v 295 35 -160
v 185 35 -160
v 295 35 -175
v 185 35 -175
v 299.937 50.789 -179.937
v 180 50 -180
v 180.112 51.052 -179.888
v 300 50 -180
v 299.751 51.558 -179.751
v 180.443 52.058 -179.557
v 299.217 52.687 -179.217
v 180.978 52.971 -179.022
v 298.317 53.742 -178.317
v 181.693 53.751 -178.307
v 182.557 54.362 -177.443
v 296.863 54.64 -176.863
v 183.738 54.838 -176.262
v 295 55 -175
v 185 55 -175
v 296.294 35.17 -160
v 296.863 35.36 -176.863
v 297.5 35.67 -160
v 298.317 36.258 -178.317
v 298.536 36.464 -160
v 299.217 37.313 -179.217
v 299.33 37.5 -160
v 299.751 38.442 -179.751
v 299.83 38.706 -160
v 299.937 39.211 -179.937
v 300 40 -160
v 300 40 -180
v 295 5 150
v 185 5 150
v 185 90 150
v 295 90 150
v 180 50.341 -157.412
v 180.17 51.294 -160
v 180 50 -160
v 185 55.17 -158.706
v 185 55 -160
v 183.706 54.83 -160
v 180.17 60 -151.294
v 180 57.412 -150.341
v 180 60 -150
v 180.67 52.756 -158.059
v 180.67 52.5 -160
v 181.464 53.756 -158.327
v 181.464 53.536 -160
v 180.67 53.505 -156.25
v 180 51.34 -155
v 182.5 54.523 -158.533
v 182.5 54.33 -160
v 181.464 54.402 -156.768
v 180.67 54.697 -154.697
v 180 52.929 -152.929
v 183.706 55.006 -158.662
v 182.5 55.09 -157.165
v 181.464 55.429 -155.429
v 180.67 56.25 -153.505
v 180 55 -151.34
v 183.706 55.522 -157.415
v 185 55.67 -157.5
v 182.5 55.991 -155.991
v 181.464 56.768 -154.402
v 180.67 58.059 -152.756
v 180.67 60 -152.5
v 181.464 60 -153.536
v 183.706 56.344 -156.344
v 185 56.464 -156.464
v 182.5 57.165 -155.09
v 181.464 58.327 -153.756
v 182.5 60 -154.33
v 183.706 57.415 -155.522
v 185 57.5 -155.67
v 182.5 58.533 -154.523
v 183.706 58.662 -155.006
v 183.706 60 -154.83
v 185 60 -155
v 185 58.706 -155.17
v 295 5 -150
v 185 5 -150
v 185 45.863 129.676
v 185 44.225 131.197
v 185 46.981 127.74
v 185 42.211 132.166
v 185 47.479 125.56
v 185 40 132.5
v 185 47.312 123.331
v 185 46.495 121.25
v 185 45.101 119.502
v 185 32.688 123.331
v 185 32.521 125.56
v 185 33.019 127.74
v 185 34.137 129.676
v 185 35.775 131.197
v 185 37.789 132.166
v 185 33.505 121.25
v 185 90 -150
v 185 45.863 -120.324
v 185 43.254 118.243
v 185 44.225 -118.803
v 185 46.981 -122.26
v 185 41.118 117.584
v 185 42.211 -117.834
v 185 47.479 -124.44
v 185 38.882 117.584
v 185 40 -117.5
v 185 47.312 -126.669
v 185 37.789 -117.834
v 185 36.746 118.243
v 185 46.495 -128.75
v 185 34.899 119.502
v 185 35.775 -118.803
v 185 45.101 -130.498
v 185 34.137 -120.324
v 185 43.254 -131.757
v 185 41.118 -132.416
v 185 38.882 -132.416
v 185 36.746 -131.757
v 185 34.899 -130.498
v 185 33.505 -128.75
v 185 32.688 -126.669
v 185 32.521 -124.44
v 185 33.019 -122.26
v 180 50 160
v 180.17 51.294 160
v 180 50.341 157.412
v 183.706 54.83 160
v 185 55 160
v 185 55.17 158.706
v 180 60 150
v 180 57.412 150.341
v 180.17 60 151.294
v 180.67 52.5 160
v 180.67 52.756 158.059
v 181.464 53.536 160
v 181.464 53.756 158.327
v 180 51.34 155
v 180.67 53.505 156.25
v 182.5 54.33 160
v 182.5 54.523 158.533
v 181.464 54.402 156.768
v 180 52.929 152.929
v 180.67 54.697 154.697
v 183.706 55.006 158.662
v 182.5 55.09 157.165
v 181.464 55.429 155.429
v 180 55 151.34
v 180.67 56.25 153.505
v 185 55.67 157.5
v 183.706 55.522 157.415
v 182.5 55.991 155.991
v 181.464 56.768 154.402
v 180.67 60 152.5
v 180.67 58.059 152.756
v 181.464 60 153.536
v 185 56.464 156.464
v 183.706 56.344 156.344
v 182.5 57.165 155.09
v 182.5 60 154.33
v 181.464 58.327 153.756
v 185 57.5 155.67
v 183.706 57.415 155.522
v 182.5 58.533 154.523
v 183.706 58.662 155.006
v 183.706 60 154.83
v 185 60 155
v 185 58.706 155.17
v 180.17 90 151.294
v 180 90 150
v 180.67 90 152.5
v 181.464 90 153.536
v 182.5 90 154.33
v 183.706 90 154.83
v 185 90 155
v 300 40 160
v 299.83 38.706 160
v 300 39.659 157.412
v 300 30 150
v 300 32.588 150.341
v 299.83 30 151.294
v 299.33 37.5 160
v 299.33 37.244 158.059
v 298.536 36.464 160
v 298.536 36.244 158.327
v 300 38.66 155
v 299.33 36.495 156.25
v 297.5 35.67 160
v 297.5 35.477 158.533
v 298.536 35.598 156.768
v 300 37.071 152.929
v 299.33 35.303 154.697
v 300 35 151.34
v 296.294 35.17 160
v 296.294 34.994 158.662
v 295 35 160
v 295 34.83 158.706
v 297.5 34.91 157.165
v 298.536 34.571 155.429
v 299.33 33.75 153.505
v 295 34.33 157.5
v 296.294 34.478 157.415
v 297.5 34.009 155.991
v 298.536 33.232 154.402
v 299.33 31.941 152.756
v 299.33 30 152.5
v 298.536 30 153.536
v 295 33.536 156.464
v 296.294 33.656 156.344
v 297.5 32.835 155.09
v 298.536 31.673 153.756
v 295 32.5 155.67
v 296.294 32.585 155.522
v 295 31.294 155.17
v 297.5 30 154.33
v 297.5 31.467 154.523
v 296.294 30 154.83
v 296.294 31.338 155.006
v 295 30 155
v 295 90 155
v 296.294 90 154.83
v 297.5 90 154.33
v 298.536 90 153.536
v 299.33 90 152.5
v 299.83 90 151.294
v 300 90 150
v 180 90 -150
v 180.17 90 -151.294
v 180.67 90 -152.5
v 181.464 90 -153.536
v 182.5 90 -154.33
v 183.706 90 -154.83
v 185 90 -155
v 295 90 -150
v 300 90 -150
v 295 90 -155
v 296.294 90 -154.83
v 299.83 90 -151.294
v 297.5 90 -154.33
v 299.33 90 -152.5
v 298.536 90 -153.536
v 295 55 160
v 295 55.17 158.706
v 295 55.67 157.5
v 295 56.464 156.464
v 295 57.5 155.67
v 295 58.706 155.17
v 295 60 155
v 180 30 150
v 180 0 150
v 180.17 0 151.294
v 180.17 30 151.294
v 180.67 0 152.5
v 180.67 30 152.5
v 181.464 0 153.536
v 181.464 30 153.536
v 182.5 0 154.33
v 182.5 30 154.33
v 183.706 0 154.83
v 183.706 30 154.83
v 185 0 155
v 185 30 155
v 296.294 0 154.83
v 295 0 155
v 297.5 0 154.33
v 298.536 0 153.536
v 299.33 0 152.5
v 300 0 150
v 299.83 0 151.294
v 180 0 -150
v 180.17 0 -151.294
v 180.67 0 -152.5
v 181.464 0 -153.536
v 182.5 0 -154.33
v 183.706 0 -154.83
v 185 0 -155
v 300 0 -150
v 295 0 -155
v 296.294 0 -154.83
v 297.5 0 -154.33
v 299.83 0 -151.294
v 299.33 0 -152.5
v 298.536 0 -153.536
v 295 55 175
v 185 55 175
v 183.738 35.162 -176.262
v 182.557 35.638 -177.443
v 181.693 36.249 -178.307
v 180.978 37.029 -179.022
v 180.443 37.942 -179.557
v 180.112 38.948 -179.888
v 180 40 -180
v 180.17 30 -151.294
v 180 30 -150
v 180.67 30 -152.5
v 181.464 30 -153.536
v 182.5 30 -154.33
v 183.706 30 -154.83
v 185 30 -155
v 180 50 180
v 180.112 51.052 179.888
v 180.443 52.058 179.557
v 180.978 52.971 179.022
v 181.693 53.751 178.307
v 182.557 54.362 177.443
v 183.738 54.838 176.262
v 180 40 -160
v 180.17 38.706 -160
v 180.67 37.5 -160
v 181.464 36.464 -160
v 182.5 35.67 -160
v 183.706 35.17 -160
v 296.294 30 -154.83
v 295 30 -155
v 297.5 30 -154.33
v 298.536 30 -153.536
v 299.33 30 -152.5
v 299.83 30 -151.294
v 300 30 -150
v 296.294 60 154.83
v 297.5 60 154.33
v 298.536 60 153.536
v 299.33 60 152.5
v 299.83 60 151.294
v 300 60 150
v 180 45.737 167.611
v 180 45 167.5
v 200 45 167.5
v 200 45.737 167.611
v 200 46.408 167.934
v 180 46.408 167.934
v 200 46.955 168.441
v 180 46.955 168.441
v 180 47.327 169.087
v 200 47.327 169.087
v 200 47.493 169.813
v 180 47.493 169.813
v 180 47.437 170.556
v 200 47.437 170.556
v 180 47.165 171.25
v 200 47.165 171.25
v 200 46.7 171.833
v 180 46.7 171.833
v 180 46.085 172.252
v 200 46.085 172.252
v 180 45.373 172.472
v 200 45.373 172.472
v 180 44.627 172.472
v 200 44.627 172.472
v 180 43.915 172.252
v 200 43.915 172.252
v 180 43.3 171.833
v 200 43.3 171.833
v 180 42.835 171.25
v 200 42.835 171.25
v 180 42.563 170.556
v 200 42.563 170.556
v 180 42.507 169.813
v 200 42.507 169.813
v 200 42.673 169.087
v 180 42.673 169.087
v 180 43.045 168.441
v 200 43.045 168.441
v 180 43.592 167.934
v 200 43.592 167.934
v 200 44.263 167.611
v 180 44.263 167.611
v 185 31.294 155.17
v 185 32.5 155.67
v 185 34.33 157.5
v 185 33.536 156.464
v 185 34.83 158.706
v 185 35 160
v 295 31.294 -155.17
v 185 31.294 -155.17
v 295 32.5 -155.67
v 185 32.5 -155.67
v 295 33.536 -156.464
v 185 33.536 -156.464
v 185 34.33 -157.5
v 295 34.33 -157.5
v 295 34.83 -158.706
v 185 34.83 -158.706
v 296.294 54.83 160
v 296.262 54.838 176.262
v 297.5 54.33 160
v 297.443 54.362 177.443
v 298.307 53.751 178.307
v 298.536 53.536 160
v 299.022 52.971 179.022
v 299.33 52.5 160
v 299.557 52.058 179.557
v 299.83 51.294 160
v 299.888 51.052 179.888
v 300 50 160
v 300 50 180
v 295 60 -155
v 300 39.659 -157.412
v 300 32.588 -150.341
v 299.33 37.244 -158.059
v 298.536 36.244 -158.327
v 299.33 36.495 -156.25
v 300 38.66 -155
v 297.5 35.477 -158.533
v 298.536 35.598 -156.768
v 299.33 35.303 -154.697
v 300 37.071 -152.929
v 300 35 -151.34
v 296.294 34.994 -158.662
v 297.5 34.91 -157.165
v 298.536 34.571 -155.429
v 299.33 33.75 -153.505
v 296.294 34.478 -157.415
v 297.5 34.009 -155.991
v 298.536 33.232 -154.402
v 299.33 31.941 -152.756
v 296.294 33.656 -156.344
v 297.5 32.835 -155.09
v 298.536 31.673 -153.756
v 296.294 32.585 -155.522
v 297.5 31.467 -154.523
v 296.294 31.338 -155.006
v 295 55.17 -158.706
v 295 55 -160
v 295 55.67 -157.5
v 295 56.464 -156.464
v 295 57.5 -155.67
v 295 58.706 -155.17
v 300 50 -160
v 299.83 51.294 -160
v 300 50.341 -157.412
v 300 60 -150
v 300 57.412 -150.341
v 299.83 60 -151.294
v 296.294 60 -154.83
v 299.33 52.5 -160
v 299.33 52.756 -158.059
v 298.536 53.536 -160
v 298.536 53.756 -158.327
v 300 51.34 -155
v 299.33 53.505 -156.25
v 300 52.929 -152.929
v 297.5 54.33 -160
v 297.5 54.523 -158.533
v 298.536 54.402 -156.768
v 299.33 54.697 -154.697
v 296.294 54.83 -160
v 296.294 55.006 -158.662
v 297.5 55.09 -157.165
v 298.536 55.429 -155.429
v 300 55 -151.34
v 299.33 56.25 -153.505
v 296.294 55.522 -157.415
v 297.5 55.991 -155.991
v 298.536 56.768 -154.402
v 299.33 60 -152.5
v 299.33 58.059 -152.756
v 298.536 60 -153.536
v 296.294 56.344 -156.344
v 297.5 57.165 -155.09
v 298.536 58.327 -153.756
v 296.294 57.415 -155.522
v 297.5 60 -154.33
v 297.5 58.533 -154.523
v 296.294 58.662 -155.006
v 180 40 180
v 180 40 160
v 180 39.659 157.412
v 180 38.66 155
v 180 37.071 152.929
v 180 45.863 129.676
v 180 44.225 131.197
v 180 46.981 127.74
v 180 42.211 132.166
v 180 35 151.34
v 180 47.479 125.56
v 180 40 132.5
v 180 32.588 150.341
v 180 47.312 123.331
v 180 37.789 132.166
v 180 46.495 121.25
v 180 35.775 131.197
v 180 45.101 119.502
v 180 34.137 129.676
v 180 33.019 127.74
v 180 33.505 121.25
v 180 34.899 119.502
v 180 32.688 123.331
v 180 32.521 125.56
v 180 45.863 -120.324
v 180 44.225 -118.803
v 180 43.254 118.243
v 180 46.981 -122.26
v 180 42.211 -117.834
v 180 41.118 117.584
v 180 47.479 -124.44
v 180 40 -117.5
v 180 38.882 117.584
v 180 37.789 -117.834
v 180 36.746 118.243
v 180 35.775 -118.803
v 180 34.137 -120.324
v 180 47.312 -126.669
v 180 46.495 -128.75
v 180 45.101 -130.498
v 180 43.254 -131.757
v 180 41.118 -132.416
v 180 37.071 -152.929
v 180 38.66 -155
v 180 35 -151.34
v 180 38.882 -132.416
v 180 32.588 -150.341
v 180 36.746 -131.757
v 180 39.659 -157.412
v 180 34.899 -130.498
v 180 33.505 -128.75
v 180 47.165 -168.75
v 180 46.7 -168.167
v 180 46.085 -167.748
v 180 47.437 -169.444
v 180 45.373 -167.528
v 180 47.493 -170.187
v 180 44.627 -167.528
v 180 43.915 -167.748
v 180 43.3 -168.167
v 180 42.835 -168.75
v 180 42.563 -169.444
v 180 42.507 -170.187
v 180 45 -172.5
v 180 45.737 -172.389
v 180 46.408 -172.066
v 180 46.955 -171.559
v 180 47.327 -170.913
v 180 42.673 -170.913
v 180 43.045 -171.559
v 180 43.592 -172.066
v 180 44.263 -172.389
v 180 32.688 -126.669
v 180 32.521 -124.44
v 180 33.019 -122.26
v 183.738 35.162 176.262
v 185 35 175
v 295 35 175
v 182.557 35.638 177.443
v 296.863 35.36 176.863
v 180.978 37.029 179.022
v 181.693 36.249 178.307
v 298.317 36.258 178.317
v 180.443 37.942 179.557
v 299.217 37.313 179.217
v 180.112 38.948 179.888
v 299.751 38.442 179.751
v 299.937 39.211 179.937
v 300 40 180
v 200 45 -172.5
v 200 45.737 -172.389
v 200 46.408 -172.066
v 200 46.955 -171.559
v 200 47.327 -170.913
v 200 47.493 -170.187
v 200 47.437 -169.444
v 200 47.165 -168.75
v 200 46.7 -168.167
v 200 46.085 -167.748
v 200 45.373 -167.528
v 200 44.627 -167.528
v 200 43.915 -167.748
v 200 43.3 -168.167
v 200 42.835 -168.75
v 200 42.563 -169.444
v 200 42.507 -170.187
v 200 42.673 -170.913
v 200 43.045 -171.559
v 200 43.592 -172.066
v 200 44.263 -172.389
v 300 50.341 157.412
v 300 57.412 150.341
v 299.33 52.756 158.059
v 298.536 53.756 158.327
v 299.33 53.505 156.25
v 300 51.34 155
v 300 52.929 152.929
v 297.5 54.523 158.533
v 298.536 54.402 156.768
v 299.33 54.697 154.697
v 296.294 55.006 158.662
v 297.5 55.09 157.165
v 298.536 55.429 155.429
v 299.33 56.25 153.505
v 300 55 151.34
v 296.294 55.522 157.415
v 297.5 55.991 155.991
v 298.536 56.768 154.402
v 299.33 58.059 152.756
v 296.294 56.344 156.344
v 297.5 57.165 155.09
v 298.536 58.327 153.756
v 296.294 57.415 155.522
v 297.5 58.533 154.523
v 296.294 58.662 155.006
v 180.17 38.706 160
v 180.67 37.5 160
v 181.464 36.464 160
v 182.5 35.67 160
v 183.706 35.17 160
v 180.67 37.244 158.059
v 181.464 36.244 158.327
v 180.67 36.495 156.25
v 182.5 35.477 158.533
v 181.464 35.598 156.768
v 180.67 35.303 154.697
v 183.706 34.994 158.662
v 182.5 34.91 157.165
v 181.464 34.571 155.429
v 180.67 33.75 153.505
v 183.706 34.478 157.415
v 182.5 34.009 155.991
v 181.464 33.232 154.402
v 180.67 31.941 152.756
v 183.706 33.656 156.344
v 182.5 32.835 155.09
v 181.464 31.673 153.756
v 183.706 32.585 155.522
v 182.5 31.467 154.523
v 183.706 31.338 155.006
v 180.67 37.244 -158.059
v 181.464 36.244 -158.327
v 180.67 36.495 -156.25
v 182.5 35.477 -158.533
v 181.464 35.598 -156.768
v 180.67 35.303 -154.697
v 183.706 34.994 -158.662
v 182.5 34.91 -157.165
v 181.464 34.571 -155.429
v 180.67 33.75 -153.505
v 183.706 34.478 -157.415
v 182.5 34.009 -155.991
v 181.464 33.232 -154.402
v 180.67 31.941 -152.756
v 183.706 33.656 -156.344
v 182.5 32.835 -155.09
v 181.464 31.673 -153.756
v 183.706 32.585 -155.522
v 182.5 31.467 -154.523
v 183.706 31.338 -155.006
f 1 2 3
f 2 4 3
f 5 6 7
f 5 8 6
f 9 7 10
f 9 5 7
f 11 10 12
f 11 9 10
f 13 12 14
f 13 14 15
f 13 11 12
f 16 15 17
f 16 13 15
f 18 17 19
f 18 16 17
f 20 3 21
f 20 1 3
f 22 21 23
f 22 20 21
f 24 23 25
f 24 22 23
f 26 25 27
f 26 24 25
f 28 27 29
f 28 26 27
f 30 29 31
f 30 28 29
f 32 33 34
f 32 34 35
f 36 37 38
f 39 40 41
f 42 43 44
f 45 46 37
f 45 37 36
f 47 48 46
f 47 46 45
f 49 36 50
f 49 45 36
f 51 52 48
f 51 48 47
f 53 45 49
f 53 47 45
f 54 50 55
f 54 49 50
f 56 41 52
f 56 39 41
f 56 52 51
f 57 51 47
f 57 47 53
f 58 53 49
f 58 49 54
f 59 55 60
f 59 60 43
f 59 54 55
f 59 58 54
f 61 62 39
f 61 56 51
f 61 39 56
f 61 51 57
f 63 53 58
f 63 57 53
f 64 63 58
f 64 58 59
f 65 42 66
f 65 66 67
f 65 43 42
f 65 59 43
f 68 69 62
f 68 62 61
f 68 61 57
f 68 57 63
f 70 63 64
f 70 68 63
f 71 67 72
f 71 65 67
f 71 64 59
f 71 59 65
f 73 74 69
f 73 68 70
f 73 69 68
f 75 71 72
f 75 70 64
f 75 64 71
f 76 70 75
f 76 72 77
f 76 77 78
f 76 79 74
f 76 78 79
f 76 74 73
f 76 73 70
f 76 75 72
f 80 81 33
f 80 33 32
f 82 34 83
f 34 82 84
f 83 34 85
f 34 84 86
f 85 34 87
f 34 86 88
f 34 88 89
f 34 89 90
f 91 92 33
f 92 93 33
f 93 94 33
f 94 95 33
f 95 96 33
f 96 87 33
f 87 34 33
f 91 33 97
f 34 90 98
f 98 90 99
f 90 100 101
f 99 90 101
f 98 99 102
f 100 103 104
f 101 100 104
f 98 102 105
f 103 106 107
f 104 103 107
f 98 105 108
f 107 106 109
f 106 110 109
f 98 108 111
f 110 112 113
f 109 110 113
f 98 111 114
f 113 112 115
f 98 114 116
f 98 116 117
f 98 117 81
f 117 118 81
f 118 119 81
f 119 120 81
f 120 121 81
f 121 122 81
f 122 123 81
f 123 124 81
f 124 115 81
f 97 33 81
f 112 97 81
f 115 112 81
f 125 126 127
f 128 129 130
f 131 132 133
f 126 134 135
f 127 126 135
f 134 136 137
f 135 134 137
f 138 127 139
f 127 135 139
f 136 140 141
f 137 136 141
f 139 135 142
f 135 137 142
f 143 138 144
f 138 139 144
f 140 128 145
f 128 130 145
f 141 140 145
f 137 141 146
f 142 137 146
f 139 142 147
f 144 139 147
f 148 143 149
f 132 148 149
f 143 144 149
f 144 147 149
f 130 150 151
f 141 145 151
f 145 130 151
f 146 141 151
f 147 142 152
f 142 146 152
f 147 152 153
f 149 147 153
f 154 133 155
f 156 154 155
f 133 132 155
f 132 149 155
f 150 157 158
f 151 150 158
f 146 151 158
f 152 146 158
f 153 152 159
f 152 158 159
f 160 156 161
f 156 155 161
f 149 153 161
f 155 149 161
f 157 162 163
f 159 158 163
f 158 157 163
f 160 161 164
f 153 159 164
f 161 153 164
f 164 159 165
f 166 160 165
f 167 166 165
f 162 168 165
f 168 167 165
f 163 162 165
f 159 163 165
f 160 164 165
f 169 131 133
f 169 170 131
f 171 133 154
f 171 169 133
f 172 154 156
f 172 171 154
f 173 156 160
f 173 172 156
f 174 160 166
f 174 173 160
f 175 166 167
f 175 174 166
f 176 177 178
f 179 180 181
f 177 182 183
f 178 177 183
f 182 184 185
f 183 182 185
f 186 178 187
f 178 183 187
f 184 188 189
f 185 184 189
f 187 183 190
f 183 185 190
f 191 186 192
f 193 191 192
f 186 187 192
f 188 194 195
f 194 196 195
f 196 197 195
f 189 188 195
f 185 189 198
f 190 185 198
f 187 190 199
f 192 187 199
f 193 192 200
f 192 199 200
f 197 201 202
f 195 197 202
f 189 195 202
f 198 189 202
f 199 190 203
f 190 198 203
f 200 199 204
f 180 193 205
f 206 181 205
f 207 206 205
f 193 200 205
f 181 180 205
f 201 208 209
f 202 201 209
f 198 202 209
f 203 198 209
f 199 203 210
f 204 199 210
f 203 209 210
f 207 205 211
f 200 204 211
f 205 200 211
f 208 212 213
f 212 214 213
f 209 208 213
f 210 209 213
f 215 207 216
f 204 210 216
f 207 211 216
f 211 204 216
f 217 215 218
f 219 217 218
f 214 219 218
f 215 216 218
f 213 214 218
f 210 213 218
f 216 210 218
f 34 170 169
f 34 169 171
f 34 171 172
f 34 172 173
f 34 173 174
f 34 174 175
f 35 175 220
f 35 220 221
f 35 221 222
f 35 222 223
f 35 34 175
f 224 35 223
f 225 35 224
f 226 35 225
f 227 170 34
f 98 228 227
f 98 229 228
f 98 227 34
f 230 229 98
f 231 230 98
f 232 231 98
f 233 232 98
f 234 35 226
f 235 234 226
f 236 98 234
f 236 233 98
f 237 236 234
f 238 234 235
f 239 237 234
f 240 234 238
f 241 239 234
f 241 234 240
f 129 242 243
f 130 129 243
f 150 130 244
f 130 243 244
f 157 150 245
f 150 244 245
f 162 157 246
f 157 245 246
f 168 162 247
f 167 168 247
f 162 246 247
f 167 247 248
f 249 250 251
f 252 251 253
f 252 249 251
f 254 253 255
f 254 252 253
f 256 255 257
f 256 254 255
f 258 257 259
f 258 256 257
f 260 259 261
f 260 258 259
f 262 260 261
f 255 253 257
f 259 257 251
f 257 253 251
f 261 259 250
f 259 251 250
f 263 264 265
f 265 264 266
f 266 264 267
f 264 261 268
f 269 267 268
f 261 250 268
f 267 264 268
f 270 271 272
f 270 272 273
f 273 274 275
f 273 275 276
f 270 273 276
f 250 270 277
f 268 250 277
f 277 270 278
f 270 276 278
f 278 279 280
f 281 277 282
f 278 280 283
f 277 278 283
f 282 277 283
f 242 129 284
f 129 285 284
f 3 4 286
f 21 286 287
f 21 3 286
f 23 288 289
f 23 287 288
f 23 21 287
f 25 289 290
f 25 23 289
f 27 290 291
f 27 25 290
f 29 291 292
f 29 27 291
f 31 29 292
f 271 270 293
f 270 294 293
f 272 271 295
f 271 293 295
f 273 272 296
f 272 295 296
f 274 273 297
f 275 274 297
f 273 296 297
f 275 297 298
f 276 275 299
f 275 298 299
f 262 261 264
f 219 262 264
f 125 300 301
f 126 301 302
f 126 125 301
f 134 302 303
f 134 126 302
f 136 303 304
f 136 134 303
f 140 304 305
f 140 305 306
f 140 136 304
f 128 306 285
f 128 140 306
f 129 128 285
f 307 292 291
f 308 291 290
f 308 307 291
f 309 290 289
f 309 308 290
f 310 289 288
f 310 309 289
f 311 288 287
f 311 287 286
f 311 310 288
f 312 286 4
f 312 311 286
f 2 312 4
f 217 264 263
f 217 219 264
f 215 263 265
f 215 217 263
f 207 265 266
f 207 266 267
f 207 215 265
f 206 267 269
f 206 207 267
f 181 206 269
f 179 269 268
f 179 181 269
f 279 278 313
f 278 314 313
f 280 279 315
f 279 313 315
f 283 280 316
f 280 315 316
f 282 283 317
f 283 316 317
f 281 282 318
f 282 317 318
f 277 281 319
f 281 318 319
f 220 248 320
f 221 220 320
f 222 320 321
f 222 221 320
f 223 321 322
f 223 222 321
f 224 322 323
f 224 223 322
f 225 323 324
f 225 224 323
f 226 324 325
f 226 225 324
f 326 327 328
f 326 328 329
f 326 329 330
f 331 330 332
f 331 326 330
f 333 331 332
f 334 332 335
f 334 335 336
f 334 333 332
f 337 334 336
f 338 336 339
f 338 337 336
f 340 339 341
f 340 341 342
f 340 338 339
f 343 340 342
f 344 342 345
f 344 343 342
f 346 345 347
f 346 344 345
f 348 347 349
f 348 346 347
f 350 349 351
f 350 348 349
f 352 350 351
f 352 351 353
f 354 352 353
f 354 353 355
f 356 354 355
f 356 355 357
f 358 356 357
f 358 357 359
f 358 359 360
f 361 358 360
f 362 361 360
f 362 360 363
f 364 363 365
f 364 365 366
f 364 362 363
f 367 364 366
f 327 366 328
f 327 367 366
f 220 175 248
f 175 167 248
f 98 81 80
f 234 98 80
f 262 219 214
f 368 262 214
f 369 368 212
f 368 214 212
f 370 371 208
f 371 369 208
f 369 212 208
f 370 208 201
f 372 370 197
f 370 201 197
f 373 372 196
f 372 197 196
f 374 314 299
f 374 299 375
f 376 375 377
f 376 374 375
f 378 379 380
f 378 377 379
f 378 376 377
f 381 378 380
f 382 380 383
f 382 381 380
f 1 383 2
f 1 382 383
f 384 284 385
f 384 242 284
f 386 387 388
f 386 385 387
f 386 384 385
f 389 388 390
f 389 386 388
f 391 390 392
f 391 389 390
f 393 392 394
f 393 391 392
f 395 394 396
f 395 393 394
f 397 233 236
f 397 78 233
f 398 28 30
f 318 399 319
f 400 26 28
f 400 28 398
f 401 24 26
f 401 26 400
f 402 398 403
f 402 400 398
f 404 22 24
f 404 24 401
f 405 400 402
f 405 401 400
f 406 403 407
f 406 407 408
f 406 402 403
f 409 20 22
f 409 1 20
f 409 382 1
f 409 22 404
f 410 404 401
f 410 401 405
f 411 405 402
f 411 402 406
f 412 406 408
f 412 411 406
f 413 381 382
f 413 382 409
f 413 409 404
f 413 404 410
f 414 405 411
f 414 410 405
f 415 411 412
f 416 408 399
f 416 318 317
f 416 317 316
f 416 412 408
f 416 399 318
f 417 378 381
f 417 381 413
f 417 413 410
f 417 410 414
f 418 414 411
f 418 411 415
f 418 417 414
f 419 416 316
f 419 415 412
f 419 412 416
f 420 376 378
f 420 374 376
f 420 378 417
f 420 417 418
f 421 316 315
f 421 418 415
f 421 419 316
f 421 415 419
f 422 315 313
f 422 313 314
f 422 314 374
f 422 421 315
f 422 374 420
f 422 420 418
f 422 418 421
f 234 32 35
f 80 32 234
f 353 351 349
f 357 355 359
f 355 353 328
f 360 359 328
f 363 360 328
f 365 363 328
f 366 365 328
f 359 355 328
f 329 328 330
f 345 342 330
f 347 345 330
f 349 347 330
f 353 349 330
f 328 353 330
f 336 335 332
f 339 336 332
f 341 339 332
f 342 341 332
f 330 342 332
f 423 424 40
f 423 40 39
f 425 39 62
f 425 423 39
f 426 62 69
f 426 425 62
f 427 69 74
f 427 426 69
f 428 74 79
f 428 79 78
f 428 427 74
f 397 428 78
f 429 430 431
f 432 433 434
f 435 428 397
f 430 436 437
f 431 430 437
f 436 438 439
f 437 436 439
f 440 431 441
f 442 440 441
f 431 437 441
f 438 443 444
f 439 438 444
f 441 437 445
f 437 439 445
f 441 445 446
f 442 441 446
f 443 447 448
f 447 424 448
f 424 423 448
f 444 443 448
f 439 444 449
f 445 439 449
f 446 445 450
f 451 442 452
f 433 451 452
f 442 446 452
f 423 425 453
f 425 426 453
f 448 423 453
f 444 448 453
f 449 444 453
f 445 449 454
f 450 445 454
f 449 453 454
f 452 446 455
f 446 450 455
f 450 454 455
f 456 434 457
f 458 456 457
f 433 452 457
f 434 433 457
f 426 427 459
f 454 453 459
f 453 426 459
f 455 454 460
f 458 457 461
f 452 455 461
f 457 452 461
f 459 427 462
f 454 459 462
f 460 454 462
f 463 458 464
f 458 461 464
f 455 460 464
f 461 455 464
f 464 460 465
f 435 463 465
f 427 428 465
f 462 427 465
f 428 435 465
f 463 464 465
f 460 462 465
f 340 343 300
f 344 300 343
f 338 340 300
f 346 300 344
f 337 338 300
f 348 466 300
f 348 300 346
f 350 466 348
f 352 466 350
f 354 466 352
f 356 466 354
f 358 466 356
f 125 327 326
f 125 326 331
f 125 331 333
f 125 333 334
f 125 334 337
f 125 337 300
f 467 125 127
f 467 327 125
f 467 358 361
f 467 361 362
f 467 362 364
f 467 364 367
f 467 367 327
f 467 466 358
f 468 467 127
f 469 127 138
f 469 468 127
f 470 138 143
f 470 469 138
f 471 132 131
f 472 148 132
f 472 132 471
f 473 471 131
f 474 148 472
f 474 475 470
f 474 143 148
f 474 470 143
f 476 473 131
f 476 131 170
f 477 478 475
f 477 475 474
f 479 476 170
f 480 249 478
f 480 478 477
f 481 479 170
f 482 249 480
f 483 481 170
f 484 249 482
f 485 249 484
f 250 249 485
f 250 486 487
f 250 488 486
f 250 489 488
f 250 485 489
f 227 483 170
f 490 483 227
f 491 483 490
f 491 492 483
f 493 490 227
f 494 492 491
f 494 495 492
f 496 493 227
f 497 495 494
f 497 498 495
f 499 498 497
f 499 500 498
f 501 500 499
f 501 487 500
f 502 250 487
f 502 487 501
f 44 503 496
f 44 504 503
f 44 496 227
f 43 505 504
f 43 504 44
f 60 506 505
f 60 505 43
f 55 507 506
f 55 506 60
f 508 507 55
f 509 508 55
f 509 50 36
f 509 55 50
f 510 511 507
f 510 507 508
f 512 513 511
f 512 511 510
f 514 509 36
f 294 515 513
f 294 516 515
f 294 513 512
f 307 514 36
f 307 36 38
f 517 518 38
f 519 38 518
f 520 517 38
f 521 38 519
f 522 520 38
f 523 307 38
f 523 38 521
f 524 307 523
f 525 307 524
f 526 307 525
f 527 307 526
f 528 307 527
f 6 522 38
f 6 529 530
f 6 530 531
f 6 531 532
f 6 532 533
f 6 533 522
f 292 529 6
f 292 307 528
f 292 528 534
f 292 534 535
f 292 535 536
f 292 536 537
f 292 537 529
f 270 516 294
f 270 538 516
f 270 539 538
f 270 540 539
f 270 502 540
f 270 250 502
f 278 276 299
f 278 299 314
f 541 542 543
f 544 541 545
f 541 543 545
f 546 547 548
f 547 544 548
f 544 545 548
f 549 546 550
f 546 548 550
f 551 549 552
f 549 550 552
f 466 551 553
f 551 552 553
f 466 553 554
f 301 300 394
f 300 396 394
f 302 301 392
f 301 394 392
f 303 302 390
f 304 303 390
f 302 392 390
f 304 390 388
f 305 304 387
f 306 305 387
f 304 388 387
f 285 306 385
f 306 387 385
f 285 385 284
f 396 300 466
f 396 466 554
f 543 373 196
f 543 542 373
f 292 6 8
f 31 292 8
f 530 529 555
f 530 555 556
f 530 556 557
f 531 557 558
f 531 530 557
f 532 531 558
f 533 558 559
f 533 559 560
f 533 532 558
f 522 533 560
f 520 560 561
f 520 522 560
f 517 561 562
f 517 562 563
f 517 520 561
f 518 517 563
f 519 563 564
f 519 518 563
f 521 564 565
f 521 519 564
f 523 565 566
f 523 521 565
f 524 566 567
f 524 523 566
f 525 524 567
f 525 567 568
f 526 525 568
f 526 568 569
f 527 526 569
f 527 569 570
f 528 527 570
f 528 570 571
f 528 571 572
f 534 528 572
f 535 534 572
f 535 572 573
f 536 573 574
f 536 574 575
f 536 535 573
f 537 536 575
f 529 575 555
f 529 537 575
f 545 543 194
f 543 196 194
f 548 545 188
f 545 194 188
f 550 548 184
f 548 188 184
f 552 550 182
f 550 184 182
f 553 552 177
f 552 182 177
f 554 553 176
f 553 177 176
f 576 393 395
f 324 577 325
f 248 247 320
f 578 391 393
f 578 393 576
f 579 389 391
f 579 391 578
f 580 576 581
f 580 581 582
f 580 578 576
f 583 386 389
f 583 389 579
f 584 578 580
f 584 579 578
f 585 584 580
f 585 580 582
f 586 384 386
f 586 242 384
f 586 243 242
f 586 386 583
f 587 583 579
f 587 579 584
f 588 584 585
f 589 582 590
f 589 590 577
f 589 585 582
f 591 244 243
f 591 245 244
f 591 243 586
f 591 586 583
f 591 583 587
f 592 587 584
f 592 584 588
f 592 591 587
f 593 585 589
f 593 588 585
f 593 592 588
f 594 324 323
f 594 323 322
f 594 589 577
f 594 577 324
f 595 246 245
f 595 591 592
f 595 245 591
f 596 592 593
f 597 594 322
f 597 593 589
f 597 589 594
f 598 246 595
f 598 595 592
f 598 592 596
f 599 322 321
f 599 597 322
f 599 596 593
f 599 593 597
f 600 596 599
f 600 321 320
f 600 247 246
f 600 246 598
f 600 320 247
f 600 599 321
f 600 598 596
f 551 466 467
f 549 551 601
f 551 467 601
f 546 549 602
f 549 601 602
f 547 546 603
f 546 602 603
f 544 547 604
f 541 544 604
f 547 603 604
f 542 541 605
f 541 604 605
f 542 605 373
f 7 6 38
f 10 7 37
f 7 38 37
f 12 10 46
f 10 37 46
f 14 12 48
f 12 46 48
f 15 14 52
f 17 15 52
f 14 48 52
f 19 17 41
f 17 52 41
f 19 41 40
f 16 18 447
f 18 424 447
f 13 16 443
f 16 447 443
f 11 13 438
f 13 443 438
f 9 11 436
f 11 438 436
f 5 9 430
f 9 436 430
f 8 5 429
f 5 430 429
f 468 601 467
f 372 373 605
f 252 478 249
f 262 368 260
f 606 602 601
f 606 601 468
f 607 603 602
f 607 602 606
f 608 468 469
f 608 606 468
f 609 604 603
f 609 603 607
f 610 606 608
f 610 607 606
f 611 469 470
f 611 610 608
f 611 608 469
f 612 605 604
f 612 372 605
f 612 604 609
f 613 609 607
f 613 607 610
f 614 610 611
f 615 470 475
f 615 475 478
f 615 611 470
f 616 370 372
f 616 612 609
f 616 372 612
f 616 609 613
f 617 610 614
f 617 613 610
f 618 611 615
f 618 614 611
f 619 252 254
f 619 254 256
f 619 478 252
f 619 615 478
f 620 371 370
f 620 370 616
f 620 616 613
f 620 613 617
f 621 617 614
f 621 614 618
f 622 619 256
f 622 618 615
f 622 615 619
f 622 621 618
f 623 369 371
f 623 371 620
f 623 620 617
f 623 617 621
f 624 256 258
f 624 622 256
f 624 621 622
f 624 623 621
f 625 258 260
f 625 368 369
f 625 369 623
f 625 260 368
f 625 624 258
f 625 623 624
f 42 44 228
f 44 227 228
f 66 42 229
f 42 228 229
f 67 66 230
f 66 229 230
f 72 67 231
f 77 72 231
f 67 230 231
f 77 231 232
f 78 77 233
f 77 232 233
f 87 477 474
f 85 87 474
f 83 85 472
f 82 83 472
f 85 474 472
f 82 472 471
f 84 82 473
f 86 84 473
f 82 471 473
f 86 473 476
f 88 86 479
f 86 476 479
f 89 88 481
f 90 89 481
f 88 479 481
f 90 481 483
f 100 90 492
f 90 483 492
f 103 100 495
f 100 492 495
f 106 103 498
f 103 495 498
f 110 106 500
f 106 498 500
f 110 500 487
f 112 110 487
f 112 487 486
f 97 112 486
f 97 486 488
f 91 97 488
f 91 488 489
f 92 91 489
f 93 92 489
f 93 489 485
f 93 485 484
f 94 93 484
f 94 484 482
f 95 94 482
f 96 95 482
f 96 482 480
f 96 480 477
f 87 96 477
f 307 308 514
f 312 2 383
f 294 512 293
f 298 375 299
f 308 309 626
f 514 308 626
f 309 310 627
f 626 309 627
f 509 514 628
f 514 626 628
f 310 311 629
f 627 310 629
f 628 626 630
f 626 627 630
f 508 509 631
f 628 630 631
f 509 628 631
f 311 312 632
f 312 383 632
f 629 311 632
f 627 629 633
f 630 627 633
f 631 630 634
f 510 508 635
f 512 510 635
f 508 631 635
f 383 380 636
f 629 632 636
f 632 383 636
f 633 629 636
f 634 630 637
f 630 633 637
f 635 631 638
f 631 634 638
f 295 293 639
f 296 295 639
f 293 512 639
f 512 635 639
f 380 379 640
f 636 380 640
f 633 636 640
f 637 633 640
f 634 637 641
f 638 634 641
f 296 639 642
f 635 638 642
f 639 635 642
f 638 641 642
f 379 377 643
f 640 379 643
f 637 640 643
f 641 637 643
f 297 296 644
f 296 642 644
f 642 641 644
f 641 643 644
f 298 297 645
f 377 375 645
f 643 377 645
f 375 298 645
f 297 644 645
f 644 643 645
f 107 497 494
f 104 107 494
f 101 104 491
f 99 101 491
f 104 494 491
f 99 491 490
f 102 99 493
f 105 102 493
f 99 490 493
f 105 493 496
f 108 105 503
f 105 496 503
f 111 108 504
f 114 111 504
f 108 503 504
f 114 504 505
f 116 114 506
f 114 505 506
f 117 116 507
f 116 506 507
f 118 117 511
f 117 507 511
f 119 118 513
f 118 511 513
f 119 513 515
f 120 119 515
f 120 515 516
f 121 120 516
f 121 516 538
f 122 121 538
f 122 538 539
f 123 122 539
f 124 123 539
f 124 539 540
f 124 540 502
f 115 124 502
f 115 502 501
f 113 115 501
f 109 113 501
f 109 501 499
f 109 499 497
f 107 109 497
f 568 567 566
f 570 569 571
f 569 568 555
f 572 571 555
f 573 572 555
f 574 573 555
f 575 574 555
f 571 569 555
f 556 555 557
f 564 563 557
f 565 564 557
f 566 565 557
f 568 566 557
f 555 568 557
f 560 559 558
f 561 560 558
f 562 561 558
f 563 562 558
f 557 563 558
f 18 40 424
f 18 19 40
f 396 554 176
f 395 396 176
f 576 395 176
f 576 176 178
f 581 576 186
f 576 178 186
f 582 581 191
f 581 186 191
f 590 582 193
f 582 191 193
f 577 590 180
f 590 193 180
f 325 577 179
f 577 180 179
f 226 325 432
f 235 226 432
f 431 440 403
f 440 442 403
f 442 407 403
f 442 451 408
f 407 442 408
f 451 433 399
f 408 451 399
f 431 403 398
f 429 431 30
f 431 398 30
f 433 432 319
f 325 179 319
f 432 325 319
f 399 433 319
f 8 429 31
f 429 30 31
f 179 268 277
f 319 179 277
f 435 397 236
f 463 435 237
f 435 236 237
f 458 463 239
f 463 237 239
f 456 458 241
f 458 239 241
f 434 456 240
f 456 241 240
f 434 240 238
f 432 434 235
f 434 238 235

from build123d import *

# Parameters (mm, degrees)
SKETCH1_W           = 120
SKETCH1_H           = 310
BOSS_EXTRUDE4_DEPTH = 90
SHELL2_T            = -5
SKETCH2_R           = 7.499675099
CUT_EXTRUDE1_DEPTH  = 10
SKETCH3_W           = 120
SKETCH3_H           = 20
BOSS_EXTRUDE5_DEPTH = 25
SKETCH4_R           = 2.5
CUT_EXTRUDE2_DEPTH  = 20
FILLET1_R           = 5


with BuildPart() as part:
    # Sketch1 → Boss-Extrude4 (new body)
    with BuildSketch(Plane(origin=(0, 0, 0), x_dir=(1, 0, 0), z_dir=(0, 1, 0))):
        with Locations((240, 0)):
            Rectangle(SKETCH1_W, SKETCH1_H)
    extrude(amount=BOSS_EXTRUDE4_DEPTH)

    # Shell2
    shell2_openings = [part.faces().sort_by_distance(p)[0] for p in [
        (240, 90, 0),
    ]]
    offset(amount=SHELL2_T, openings=shell2_openings, kind=Kind.INTERSECTION)

    # Sketch2 → Cut-Extrude1 (cut)
    with BuildSketch(Plane.ZY.offset(-180)):
        with Locations((-125, 40)):
            Circle(SKETCH2_R)
        with Locations((125, 40)):
            Circle(SKETCH2_R)
    extrude(amount=-CUT_EXTRUDE1_DEPTH, mode=Mode.SUBTRACT)

    # Sketch3 → Boss-Extrude5 (add)
    with BuildSketch(Plane.XY.offset(180)):
        with Locations((240, 45)):
            Rectangle(SKETCH3_W, SKETCH3_H)
    boss_extrude5 = extrude(amount=-BOSS_EXTRUDE5_DEPTH)

    # Mirror1: Boss-Extrude5 across plane
    add(boss_extrude5.mirror(Plane.XY))

    # Sketch4 → Cut-Extrude2 (cut)
    with BuildSketch(Plane(origin=(180, 0, 0), x_dir=(0, 0, -1), z_dir=(1, 0, 0))):
        with Locations((-170, 45)):
            Circle(SKETCH4_R)
        with Locations((170, 45)):
            Circle(SKETCH4_R)
    extrude(amount=CUT_EXTRUDE2_DEPTH, mode=Mode.SUBTRACT)

    # Fillet1
    fillet1_edges = [part.edges().sort_by_distance(p)[0] for p in [
        (300, 17.5, 155),
        (180, 17.5, 155),
        (240, 55, 155),
        (240, 35, 155),
        (180, 55, 167.5),
        (180, 35, 167.5),
        (240, 55, 180),
        (240, 35, 180),
        (300, 55, 167.5),
        (300, 35, 167.5),
        (180, 17.5, -155),
        (300, 17.5, -155),
        (240, 35, -155),
        (240, 55, -155),
        (180, 35, -167.5),
        (240, 35, -180),
        (180, 55, -167.5),
        (300, 35, -167.5),
        (300, 55, -167.5),
        (240, 55, -180),
        (180, 72.5, -155),
        (300, 72.5, -155),
        (300, 72.5, 155),
        (180, 72.5, 155),
    ]]
    fillet(fillet1_edges, radius=FILLET1_R)


solid = part.part
